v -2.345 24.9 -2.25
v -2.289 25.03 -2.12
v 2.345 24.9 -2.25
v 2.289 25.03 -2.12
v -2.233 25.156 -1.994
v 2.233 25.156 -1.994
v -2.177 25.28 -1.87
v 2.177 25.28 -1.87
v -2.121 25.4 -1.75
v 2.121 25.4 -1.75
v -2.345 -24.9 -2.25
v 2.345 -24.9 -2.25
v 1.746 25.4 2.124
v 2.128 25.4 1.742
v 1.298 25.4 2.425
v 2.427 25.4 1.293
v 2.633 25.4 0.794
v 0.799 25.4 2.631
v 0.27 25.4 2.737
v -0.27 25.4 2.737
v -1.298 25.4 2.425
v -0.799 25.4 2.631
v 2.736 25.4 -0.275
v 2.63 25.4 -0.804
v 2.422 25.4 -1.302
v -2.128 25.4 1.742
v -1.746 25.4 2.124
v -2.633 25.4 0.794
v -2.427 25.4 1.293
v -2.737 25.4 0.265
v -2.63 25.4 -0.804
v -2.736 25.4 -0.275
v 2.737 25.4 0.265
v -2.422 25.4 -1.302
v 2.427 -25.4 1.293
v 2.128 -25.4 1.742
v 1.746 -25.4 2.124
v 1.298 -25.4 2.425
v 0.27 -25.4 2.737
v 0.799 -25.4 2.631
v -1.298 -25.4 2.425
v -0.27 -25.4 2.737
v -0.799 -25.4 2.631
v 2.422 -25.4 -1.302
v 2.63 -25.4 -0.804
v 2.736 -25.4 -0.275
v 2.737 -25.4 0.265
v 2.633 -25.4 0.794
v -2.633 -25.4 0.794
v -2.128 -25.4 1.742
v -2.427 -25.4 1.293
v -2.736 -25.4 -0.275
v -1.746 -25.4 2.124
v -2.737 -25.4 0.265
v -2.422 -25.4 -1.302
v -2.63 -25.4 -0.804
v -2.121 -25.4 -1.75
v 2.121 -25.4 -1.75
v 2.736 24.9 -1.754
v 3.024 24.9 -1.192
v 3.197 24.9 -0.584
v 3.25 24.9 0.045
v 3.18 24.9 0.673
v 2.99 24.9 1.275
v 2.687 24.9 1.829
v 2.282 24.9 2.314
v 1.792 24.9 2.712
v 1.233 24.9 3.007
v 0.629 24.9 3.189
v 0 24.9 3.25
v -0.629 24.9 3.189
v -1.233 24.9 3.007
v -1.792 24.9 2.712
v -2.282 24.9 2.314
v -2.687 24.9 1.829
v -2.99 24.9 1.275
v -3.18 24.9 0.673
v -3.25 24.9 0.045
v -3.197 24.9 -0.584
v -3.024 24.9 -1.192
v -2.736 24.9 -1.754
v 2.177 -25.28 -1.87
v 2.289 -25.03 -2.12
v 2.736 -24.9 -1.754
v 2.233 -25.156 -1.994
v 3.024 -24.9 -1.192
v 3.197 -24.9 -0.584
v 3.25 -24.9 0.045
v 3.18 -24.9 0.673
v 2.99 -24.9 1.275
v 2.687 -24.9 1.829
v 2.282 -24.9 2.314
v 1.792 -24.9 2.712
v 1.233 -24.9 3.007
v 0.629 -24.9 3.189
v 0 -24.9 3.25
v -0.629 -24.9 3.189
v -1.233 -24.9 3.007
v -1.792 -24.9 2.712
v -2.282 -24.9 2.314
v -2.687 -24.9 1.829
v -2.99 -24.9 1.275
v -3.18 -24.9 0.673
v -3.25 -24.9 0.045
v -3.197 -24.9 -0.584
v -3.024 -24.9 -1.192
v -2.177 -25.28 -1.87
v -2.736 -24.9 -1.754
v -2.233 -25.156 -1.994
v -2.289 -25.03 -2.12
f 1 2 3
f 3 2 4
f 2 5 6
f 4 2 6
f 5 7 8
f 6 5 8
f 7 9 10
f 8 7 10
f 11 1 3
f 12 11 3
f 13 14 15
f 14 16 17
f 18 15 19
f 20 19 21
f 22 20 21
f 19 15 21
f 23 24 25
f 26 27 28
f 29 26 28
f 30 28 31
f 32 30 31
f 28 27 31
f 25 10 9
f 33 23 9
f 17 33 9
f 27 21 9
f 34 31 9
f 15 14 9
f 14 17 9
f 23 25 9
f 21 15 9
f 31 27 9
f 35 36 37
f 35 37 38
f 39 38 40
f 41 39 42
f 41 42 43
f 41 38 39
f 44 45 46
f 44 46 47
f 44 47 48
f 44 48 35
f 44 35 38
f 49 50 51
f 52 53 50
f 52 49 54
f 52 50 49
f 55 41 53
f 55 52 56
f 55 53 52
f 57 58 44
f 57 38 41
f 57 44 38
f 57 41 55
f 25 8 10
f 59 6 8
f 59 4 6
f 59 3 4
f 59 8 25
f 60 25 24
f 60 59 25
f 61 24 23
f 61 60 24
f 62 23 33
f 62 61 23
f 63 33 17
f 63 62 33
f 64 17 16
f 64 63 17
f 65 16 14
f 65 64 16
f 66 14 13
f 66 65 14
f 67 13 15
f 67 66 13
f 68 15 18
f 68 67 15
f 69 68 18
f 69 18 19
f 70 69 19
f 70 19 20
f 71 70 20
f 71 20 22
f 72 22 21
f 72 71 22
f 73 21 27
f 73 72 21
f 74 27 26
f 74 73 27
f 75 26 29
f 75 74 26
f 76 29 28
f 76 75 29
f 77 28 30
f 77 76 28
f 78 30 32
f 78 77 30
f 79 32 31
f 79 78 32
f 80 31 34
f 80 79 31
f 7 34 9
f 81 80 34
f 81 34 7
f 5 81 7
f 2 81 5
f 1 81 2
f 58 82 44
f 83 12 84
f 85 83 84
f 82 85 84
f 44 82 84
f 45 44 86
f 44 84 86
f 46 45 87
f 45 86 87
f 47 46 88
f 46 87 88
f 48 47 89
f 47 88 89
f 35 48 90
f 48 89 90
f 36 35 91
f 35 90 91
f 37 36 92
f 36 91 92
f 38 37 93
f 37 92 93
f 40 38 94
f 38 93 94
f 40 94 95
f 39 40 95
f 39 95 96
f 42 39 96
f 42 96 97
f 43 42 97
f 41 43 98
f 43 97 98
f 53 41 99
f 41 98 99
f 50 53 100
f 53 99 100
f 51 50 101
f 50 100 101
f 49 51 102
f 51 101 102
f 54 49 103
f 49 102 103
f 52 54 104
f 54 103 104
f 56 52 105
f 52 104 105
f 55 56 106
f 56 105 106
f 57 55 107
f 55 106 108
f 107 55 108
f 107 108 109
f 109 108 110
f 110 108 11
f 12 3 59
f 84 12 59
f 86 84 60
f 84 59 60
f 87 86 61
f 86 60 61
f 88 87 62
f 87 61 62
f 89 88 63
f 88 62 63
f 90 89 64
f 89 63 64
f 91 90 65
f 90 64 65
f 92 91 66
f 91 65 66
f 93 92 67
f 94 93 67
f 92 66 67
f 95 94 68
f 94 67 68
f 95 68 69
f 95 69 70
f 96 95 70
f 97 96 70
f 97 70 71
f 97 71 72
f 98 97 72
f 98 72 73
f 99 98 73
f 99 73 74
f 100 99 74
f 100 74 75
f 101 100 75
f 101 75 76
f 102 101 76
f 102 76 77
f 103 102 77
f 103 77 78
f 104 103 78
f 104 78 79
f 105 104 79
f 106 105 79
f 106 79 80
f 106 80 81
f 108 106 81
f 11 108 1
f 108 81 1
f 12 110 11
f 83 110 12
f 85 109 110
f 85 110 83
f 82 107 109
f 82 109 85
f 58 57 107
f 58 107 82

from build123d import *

# Parameters (mm, degrees)
BOSS_EXTRUDE1_DEPTH = 25.4
CHAMFER1_SIZE       = 0.5


with BuildPart() as part:
    # Sketch1 → Boss-Extrude1 (new body, symmetric)
    with BuildSketch(Plane(origin=(0, 0, 0), x_dir=(1, 0, 0), z_dir=(0, 1, 0))):
        with BuildLine():
            Line((-2.34520788, 2.25), (2.34520788, 2.25))
            ThreePointArc((2.34520788, 2.25), (0, -3.25), (-2.34520788, 2.25))
        make_face()
    extrude(amount=BOSS_EXTRUDE1_DEPTH, both=True)

    # Chamfer1
    chamfer1_edges = [part.edges().sort_by_distance(p)[0] for p in [
        (0, -25.4, -2.25),
        (0, -25.4, 3.25),
        (0, 25.4, 3.25),
        (0, 25.4, -2.25),
    ]]
    chamfer(chamfer1_edges, length=CHAMFER1_SIZE)


solid = part.part
